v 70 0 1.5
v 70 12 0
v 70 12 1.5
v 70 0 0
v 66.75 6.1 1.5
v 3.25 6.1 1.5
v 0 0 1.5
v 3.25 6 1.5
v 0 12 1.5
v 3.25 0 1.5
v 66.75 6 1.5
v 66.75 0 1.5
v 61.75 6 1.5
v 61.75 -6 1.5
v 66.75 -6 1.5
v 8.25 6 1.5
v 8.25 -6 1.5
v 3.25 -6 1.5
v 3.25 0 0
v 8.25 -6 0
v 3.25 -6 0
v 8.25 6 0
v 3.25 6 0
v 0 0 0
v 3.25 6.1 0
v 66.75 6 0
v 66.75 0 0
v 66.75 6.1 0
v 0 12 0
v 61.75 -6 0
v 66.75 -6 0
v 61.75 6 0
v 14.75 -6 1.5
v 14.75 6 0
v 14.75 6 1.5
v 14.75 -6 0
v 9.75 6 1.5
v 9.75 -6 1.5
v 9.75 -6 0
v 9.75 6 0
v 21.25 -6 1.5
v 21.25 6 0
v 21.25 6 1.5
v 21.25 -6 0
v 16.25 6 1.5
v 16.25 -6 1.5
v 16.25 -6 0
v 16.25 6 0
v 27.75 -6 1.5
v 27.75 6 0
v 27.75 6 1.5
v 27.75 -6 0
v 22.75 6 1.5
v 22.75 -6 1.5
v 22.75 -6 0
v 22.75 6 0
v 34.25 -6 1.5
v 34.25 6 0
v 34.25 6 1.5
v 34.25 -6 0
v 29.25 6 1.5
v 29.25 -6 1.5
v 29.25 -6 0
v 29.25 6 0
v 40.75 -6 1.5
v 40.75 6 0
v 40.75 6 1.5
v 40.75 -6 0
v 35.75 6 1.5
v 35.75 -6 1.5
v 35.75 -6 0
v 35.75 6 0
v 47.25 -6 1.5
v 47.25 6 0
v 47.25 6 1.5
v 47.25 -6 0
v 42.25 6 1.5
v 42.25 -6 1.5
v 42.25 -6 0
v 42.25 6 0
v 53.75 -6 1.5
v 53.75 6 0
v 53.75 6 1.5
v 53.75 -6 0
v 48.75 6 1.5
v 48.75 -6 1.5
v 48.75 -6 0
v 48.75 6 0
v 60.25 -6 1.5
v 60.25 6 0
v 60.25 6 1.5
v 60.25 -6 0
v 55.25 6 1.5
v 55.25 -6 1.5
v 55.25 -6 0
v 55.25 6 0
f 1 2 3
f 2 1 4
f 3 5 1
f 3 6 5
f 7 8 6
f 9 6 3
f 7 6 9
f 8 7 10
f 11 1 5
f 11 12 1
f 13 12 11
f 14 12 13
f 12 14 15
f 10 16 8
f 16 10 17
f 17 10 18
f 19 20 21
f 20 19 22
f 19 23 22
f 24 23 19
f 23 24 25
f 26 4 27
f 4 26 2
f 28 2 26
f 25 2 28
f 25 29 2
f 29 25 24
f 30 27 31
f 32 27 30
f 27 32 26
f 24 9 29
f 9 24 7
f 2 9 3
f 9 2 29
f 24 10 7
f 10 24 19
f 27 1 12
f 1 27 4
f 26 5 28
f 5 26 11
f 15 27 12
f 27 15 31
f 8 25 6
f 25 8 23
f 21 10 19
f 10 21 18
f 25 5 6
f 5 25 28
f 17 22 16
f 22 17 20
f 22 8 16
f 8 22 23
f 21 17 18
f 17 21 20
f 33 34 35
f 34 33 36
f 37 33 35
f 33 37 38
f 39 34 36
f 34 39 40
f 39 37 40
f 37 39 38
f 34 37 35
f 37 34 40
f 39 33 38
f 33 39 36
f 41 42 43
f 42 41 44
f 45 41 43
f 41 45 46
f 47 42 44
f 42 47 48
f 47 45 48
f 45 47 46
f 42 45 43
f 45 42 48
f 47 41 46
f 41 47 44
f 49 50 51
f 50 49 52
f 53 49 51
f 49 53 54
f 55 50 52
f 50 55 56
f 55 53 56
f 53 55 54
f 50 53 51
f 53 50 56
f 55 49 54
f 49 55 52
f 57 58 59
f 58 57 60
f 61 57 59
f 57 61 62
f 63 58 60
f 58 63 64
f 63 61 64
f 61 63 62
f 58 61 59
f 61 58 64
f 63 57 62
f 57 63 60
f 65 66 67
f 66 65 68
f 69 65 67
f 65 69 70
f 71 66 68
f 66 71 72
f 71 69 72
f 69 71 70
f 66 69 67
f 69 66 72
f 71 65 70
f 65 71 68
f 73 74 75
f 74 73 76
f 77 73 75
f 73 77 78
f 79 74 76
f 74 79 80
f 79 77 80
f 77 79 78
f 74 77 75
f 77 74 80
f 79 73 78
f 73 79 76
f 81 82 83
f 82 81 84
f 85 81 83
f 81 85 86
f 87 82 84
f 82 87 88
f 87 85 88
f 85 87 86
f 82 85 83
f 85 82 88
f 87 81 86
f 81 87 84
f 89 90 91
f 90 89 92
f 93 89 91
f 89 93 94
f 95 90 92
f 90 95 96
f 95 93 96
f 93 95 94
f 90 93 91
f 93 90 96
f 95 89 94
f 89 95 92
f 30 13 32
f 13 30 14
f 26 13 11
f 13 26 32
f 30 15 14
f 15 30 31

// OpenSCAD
// 10-well Agarose Gel Casting Comb
// Designed for FDM printing, lying flat on the XY plane (Z=0).

// --- Dimensions ---
$fn = 64; // Smoothness for curved features (though this is mostly rectangular)

// Spine dimensions
SPINE_LENGTH = 70;   // mm (X)
SPINE_WIDTH = 12;    // mm (Y)
PLATE_THICKNESS = 1.5; // mm (Z)

// Tooth dimensions
NUM_TEETH = 10;
TOOTH_WIDTH = 5.0;   // mm (X)
TOOTH_LENGTH = 12;   // mm (Y) (extends from spine edge)
GAP_SIZE = 1.5;      // mm (X) between teeth

// --- Calculations ---
// Total width of the tooth row
TOOTH_ROW_WIDTH = (NUM_TEETH * TOOTH_WIDTH) + ((NUM_TEETH - 1) * GAP_SIZE);

// Offset to center the tooth row on the spine in X
X_OFFSET = (SPINE_LENGTH - TOOTH_ROW_WIDTH) / 2;

// Position of the spine edge where teeth hang (in Y)
// Spine goes from -SPINE_WIDTH/2 to +SPINE_WIDTH/2.
// Teeth hang in -Y direction, so they start at -SPINE_WIDTH/2.
SPINE_Y_START = -SPINE_WIDTH / 2;

// --- Main Body (Spine) ---
// A flat plate 70x12x1.5
difference() {
    // Outer block
    cube([SPINE_LENGTH, SPINE_WIDTH, PLATE_THICKNESS], center = false);
    
    // Cut out the area where teeth will hang to ensure clean separation
    // We cut a rectangle slightly larger than the tooth row to avoid coplanar faces
    translate([X_OFFSET, SPINE_Y_START, 0]) {
        cube([TOOTH_ROW_WIDTH, TOOTH_LENGTH + 0.1, PLATE_THICKNESS + 0.1], center = false);
    }
}

// --- Teeth ---
// We iterate through each tooth position
for (i = [0 : NUM_TEETH - 1]) {
    // Calculate X position for this tooth
    // Start at X_OFFSET, add tooth width and gaps
    current_x = X_OFFSET + (i * (TOOTH_WIDTH + GAP_SIZE));
    
    // Translate to position
    translate([current_x, SPINE_Y_START, 0]) {
        // Tooth geometry: 5.0 wide (X) x 12 long (Y) x 1.5 thick (Z)
        // The tooth hangs down from the spine edge (negative Y relative to spine center, 
        // but we anchored at SPINE_Y_START which is the bottom edge of the spine).
        // So the tooth extends from Y=0 to Y=-TOOTH_LENGTH relative to the spine bottom.
        // Wait, the spine is 12mm wide. SPINE_Y_START is -6.
        // The tooth hangs in -Y direction.
        // So the tooth occupies Y from -6 down to -6 - 12 = -18.
        
        cube([TOOTH_WIDTH, TOOTH_LENGTH, PLATE_THICKNESS], center = false);
    }
}
